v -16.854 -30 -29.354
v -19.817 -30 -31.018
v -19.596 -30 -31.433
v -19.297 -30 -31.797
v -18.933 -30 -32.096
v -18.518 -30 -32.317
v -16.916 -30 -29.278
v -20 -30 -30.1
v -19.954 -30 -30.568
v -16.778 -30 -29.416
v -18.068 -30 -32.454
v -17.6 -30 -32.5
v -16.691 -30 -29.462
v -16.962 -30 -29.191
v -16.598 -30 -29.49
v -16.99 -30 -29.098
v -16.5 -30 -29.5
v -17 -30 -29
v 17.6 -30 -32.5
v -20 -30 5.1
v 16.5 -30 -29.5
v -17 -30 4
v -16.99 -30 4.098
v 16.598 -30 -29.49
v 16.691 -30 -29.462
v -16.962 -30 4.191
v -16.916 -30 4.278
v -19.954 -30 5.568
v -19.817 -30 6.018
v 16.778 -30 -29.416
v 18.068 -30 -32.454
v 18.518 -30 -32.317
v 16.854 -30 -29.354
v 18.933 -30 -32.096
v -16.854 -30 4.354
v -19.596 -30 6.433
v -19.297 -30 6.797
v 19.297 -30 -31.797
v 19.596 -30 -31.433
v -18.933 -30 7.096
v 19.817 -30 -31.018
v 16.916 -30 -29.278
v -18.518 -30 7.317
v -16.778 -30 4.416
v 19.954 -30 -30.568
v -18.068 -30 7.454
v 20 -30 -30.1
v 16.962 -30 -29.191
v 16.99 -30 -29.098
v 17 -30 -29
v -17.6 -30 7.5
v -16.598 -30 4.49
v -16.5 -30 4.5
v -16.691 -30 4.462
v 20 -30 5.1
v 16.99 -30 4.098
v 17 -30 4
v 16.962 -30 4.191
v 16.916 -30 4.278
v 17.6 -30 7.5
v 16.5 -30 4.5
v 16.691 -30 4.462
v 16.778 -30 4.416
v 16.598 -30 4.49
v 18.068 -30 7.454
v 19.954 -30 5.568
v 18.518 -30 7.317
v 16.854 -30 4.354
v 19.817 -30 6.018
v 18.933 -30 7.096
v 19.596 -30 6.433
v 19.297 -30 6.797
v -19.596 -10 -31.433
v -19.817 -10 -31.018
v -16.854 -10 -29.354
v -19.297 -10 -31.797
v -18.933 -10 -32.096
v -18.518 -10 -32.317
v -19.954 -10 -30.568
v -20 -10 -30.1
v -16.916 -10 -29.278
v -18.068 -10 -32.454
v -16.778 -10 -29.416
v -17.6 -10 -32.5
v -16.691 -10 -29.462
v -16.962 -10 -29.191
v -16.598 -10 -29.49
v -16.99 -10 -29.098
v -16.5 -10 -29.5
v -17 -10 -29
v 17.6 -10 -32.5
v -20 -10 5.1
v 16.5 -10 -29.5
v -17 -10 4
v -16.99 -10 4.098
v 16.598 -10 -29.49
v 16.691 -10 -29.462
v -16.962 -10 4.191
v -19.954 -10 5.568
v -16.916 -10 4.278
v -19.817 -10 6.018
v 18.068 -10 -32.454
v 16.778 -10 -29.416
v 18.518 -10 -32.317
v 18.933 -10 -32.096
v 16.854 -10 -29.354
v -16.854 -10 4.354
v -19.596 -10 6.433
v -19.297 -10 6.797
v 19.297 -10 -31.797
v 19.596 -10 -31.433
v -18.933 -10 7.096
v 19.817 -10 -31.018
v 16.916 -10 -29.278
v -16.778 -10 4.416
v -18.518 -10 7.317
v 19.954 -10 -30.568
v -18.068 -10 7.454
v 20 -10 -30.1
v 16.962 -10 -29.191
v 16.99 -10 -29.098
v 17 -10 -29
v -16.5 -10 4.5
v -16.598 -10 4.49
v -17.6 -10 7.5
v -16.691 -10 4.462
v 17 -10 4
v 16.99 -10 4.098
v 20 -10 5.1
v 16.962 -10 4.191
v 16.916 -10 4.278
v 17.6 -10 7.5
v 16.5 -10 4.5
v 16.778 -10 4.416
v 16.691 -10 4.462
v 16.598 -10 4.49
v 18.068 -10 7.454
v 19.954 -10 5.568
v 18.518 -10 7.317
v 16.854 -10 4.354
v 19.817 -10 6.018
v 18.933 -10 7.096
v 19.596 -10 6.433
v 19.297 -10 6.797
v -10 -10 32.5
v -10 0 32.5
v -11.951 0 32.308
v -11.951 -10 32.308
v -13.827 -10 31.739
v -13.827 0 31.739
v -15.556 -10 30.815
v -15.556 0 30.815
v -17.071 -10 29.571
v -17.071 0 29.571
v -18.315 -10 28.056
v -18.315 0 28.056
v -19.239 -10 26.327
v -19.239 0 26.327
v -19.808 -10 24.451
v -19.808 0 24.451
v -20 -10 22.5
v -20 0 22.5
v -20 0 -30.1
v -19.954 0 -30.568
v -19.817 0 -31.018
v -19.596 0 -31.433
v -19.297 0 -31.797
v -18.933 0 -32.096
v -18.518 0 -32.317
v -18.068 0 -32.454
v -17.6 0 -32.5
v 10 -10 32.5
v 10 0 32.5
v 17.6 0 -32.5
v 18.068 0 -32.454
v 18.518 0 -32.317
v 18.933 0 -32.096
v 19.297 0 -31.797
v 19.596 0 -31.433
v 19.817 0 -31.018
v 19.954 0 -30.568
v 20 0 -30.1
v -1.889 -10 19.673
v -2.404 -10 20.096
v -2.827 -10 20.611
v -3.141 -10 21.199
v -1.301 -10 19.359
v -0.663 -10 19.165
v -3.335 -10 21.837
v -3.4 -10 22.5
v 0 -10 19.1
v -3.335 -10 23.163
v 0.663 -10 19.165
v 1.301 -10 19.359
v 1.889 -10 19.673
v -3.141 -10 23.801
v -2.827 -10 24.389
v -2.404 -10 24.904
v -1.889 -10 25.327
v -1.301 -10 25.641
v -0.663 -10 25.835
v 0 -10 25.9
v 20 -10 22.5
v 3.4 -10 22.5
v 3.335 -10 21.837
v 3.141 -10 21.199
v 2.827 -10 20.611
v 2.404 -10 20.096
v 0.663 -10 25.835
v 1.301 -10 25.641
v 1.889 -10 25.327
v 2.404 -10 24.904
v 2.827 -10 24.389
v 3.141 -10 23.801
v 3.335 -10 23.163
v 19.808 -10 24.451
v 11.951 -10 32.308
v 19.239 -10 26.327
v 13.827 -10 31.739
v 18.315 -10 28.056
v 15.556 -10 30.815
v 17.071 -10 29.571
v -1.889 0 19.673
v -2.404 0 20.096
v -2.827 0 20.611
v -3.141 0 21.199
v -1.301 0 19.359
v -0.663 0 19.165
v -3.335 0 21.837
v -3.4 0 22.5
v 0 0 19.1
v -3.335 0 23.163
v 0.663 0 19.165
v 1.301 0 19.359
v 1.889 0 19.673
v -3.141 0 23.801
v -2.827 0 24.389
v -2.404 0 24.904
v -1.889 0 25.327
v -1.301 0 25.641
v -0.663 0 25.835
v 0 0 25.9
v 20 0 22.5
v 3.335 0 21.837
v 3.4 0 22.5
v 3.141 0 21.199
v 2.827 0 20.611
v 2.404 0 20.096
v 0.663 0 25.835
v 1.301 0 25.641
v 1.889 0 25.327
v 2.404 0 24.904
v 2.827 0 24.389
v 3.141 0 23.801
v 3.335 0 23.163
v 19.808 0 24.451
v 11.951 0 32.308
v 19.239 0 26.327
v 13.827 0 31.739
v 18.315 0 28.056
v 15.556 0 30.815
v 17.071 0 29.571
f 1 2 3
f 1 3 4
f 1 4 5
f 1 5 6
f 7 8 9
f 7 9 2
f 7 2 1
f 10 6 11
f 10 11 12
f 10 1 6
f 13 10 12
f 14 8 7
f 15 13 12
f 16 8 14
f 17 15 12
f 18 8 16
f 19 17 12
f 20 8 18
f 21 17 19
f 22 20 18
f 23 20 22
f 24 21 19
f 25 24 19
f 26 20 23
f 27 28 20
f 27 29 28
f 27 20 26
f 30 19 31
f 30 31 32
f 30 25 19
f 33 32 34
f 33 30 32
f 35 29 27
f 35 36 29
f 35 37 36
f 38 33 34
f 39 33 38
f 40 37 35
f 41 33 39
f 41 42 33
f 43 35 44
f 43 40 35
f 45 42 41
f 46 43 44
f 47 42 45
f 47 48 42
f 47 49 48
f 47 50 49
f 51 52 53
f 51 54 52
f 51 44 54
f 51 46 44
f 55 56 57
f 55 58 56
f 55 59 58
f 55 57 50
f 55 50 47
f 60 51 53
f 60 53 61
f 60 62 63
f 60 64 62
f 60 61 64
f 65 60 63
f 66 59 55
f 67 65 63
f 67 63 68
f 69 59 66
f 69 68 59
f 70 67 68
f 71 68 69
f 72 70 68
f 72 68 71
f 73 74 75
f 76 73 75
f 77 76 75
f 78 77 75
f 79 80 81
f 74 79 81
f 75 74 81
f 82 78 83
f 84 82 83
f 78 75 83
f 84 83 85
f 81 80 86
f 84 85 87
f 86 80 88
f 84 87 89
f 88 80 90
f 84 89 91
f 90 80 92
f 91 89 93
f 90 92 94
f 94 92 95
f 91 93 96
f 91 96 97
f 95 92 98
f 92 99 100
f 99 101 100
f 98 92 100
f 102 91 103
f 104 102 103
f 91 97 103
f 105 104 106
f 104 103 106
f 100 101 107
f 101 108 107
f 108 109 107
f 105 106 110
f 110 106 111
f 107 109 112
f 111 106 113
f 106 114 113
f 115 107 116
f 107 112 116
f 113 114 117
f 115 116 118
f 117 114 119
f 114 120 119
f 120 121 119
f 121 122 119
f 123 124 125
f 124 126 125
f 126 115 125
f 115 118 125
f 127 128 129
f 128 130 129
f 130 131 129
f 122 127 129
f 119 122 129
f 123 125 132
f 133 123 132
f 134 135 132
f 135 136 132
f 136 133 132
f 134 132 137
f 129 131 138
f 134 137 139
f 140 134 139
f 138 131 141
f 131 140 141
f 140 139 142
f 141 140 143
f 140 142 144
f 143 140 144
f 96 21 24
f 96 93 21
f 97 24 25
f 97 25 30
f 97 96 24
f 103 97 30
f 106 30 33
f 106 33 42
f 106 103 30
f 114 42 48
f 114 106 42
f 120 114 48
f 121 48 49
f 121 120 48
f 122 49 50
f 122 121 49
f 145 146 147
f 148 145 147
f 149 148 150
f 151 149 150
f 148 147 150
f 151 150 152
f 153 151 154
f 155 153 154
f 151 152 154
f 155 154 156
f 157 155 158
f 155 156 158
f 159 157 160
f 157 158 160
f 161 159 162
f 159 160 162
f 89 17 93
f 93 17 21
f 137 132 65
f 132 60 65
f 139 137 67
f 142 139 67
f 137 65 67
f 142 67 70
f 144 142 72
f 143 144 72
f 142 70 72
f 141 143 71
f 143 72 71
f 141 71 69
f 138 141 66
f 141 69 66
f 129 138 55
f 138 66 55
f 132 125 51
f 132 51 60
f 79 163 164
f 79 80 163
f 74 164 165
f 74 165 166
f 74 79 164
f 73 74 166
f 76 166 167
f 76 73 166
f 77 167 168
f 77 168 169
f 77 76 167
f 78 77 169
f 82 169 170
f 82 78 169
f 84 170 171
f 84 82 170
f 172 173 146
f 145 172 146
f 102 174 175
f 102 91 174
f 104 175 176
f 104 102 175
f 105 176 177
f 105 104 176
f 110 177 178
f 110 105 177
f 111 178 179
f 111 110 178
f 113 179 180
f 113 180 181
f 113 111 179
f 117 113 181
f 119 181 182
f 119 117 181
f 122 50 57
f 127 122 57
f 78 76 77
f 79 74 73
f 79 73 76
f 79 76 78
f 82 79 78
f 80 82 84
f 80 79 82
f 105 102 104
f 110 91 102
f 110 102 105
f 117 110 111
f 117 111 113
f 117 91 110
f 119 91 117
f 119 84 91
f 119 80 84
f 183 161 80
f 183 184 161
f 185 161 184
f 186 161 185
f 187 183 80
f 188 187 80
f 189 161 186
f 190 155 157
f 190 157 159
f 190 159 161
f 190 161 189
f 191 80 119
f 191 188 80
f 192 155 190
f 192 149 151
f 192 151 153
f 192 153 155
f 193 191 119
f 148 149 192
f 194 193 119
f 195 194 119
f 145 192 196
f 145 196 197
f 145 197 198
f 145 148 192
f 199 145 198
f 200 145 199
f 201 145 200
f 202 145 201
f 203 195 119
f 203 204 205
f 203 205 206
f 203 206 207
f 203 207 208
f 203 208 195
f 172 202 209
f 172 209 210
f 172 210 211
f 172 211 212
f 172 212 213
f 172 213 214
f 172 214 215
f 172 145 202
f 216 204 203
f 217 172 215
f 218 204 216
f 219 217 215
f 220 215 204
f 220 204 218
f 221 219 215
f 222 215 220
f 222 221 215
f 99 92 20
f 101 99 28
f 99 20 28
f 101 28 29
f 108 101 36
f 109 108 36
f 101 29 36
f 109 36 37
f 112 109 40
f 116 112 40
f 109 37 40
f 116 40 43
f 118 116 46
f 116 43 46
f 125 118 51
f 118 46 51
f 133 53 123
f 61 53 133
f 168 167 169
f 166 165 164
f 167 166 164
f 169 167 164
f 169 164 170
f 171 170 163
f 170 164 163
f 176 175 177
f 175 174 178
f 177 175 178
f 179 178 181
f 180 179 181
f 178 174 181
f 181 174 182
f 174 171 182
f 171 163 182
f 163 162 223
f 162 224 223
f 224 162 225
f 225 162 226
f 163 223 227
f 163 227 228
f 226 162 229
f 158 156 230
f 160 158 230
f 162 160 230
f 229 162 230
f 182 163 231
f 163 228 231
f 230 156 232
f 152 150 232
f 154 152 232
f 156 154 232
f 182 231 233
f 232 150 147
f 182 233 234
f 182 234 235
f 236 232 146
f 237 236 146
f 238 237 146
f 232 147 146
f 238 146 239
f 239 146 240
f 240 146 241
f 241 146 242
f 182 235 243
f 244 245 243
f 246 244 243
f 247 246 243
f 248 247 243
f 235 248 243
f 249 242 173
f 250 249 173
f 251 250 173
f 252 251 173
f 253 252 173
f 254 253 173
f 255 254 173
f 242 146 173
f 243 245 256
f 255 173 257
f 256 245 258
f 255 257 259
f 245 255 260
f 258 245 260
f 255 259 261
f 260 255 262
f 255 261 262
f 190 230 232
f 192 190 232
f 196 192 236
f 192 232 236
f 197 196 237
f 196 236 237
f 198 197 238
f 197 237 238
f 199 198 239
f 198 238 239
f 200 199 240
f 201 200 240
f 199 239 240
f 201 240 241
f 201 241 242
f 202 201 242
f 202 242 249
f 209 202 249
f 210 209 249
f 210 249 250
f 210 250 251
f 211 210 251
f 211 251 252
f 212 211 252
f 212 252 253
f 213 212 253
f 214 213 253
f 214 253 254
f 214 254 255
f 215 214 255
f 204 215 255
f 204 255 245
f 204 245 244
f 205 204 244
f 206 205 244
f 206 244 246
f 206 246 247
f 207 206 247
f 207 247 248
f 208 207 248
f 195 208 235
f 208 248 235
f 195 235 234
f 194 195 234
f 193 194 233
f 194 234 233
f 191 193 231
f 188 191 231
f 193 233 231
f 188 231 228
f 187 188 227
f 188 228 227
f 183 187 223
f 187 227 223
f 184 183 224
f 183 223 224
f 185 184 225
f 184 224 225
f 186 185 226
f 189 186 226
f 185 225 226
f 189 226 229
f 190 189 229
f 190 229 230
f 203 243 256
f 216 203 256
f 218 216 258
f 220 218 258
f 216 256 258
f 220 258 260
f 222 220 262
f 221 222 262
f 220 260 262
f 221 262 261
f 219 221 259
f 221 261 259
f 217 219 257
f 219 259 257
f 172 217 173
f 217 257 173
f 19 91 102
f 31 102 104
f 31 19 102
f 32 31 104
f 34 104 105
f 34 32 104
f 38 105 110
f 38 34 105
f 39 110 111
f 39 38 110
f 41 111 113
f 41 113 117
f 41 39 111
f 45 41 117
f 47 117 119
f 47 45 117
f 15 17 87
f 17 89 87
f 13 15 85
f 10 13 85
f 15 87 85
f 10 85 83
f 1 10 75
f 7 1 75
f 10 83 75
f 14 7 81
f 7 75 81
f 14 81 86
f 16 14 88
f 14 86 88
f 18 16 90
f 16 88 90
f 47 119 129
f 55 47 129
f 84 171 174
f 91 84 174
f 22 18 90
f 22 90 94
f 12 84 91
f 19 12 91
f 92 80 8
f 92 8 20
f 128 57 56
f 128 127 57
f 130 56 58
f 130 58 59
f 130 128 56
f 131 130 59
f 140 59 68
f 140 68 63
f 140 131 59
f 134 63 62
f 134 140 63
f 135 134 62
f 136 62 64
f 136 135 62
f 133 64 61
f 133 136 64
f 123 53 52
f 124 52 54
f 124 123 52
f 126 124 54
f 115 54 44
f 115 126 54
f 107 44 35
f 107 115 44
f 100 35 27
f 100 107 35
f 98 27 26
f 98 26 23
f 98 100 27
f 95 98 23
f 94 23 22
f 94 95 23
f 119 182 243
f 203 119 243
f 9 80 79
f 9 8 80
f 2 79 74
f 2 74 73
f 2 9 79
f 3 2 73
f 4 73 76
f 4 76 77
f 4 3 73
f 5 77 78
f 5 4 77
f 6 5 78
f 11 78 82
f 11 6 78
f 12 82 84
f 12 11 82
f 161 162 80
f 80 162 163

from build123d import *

# Parameters (mm, degrees)
F1_DEPTH = 10
F2_W     = 40
F2_H     = 40
F3_DEPTH = 20
F4_W     = 34
F4_H     = 34
F5_DEPTH = 20
F6_R     = 2.4
F7_R     = 0.5
F8_R     = 2.4
F10_D    = 6.8


with BuildPart() as f1:
    # F0 (on Front) → F1 (new body)
    with BuildSketch(Plane.XZ):
        with BuildLine():
            Line((10, 32.5), (-10, 32.5))
            ThreePointArc((-10, 32.5), (-17.0710678119, 29.5710678119), (-20, 22.5))
            Line((-20, 22.5), (-20, -32.5))
            Line((-20, -32.5), (20, -32.5))
            Line((20, -32.5), (20, 22.5))
            ThreePointArc((20, 22.5), (17.0710678119, 29.5710678119), (10, 32.5))
        make_face()
    extrude(amount=F1_DEPTH)

    # F8
    f8_edges = [f1.edges().sort_by_distance(p)[0] for p in [
        (-20, -5, -32.5),
        (20, -5, -32.5),
    ]]
    fillet(f8_edges, radius=F8_R)

    # F10 (through all)
    with Locations(Plane.XZ.offset(10)):
        with Locations((0, 22.5)):
            Hole(F10_D / 2)


with BuildPart() as f3:
    # F2 (on face) → F3 (new body)
    with BuildSketch(Plane.XZ.offset(10)):
        with Locations((0, -12.5)):
            Rectangle(F2_W, F2_H)
    extrude(amount=F3_DEPTH)

    # F4 (on face) → F5 (cut, through all)
    with BuildSketch(Plane.XZ.offset(30)):
        with Locations((0, -12.5)):
            Rectangle(F4_W, F4_H)
    extrude(amount=-F5_DEPTH, mode=Mode.SUBTRACT)

    # F6
    f6_edges = [f3.edges().sort_by_distance(p)[0] for p in [
        (-20, -20, 7.5),
        (20, -20, 7.5),
        (-20, -20, -32.5),
        (20, -20, -32.5),
    ]]
    fillet(f6_edges, radius=F6_R)

    # F7
    f7_edges = [f3.edges().sort_by_distance(p)[0] for p in [
        (-17, -20, -29.5),
        (-17, -20, 4.5),
        (17, -20, 4.5),
        (17, -20, -29.5),
    ]]
    fillet(f7_edges, radius=F7_R)


solid = Compound([f1.part, f3.part])
